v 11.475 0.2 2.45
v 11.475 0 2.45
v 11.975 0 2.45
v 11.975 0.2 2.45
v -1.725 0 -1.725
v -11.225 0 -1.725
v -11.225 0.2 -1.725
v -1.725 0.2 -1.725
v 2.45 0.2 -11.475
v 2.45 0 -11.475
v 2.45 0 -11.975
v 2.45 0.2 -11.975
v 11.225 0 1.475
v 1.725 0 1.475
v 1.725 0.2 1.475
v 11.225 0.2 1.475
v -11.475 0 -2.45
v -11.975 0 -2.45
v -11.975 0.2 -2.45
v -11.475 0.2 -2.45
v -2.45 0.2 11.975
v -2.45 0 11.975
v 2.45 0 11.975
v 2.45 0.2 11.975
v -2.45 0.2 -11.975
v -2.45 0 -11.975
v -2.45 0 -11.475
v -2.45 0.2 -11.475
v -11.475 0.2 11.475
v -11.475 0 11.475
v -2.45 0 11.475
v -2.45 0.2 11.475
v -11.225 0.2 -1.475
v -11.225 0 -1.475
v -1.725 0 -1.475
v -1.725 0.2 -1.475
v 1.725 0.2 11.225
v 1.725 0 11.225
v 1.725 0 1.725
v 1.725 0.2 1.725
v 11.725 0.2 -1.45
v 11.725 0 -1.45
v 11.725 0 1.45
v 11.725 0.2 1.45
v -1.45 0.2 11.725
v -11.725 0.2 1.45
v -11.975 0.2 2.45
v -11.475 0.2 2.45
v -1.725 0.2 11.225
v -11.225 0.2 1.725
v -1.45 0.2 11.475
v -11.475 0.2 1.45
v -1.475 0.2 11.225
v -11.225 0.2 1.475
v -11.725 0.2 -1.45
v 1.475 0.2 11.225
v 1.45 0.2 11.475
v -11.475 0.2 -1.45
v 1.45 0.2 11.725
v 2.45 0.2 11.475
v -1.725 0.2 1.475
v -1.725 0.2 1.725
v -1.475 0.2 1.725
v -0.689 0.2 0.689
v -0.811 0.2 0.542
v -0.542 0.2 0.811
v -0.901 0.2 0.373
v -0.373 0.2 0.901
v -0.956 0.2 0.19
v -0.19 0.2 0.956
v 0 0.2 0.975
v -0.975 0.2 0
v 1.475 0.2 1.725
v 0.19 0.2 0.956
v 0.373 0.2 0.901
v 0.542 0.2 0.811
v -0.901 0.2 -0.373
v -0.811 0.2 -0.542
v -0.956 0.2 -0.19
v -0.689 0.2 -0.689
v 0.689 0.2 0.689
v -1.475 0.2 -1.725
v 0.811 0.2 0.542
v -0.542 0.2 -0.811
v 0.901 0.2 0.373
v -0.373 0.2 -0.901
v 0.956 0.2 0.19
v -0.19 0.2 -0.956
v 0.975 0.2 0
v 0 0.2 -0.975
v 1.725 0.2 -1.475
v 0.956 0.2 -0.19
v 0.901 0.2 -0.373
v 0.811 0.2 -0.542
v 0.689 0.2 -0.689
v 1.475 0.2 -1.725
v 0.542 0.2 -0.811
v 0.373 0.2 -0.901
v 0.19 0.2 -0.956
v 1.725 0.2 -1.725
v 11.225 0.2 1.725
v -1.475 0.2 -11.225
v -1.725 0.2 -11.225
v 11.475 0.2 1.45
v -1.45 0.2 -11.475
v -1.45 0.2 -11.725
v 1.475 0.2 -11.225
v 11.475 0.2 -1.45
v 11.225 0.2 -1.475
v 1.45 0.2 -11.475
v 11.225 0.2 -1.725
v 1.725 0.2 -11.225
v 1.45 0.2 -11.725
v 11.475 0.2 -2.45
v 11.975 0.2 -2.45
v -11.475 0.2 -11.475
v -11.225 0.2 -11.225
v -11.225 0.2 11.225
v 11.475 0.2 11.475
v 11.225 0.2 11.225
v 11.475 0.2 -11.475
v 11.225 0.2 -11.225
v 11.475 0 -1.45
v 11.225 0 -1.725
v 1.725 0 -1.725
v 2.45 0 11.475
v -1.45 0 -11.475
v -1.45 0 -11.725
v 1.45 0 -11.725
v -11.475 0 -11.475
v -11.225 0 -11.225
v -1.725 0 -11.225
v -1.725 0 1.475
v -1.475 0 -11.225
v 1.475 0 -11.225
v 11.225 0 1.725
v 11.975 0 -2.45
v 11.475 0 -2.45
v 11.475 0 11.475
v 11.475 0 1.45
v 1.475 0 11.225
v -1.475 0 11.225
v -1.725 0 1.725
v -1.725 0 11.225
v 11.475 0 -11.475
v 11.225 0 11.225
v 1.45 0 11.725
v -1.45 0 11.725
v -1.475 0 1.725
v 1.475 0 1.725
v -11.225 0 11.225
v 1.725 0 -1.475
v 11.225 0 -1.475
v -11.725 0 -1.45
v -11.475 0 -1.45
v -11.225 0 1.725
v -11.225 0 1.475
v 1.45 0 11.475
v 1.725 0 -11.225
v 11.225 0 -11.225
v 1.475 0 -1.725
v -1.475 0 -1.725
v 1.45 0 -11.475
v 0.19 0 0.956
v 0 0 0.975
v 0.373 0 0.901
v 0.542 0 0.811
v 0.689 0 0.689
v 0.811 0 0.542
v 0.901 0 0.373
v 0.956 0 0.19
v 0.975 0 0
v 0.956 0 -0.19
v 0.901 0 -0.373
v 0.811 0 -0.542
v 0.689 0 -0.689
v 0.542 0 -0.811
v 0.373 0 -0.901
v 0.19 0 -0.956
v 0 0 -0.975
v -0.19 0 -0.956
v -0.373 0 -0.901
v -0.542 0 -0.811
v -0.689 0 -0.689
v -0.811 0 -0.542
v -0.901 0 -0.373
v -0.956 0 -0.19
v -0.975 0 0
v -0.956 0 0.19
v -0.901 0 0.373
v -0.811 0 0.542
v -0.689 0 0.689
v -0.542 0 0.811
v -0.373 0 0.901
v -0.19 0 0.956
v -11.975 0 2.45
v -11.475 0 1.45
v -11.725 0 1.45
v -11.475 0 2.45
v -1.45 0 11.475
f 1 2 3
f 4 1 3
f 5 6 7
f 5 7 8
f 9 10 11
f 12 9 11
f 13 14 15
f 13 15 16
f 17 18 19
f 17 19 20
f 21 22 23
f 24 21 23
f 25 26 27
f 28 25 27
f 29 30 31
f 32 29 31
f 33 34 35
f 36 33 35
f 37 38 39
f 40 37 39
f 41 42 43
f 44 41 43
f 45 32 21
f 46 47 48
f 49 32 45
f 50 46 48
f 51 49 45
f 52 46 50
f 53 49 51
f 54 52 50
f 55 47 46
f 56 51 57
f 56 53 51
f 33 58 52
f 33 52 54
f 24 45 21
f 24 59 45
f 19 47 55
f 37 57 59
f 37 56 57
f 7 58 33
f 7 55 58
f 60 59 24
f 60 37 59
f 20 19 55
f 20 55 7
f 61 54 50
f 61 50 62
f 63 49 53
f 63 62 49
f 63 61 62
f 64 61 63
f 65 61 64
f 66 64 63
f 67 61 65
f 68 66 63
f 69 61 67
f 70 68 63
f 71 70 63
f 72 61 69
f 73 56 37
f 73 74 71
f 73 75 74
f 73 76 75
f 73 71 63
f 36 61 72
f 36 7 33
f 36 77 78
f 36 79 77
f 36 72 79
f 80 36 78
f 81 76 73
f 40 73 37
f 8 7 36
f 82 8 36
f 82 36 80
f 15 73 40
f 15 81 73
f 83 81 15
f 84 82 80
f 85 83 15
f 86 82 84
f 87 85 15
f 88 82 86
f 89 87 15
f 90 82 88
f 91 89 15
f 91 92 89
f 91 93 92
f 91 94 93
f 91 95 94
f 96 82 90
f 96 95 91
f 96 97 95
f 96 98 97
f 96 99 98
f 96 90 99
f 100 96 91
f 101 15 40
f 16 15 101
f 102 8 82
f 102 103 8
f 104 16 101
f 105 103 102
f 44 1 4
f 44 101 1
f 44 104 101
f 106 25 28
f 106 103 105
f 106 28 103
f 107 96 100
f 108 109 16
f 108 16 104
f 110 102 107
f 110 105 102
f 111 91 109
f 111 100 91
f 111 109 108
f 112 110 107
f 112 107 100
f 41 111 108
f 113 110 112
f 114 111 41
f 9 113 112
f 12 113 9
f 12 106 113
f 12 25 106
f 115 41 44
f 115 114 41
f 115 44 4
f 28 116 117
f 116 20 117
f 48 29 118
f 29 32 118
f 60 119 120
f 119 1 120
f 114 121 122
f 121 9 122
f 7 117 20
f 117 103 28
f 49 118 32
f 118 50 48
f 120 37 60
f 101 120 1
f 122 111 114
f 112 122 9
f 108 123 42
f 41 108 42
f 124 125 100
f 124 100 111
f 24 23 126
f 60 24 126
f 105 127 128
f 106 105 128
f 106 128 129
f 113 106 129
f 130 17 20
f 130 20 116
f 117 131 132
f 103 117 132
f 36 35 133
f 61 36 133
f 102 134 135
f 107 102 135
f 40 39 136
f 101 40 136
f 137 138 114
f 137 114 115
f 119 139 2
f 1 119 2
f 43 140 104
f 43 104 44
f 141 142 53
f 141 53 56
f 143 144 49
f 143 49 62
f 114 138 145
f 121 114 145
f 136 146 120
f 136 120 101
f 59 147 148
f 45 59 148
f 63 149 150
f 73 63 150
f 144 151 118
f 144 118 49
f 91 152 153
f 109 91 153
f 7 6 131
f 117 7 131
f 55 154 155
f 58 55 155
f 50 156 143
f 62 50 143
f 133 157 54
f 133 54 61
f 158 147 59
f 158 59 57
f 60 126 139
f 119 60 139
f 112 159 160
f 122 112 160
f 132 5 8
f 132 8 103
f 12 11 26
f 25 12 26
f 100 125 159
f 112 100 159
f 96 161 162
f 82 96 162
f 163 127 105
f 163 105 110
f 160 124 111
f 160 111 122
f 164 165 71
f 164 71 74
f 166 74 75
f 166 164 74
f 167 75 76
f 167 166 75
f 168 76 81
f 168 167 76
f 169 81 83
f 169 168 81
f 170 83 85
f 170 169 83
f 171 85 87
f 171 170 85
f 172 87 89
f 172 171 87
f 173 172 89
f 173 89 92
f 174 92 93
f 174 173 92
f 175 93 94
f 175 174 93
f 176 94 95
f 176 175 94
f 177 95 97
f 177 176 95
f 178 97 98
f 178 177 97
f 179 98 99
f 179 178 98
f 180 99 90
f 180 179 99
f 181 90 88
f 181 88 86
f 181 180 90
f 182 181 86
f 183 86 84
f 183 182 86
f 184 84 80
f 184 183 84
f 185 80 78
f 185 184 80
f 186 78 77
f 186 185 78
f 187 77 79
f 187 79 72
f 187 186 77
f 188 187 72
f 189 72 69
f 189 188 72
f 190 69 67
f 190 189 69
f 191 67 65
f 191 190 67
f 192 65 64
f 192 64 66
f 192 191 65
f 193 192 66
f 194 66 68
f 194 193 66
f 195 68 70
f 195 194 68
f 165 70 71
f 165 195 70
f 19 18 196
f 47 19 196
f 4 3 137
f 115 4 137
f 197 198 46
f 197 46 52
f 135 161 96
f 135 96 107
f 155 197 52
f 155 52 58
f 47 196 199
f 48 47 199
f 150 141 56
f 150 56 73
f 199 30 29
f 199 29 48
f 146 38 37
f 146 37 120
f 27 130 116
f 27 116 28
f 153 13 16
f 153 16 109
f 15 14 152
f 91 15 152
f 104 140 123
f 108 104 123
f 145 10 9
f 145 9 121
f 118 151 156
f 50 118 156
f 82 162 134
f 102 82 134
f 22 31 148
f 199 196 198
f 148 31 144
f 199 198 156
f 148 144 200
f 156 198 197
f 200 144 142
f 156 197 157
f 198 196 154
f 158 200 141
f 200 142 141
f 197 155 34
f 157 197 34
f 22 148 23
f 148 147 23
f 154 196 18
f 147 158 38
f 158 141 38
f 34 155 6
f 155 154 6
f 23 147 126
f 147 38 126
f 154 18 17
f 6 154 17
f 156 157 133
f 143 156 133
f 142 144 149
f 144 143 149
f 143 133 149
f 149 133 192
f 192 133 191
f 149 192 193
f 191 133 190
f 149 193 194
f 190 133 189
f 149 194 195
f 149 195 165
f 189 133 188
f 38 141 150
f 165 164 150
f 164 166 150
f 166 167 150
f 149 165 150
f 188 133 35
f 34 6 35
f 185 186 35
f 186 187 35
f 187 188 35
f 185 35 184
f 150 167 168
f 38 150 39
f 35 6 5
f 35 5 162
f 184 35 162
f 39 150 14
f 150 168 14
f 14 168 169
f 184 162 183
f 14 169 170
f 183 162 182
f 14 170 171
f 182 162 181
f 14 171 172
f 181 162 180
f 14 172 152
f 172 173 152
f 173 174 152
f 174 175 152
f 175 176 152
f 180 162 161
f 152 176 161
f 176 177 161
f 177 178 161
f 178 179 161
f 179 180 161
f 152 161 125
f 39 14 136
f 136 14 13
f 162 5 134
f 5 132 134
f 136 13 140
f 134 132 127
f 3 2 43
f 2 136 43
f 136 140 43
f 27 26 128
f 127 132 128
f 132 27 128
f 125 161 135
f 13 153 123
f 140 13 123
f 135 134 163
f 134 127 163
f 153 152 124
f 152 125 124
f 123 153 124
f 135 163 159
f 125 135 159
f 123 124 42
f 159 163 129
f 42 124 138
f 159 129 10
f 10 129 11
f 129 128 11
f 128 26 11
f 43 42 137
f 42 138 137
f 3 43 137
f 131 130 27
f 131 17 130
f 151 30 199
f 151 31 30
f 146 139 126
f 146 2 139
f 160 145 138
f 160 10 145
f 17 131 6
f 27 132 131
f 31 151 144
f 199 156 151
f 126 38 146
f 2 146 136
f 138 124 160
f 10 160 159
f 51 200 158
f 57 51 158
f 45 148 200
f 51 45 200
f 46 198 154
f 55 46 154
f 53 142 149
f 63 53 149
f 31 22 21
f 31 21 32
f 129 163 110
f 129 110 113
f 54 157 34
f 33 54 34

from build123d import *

# Parameters (mm, degrees)
SKETCH1_W           = 22.95
SKETCH1_H           = 22.95
SKETCH1_W_2         = 22.45
SKETCH1_H_2         = 22.45
SKETCH1_W_3         = 0.25
SKETCH1_H_3         = 9.5
SKETCH1_W_4         = 9.5
SKETCH1_H_4         = 0.25
SKETCH1_R           = 0.975
SKETCH1_H_5         = 1
SKETCH1_W_5         = 1
BOSS_EXTRUDE5_DEPTH = 0.2


with BuildPart() as part:
    # Sketch1 → Boss-Extrude5 (new body)
    # profile 1 of 26: a face of its own
    with BuildSketch(Plane(origin=(0, 0, 0), x_dir=(1, 0, 0), z_dir=(0, 1, 0))):
        Rectangle(SKETCH1_W, SKETCH1_H)
        Rectangle(SKETCH1_W_2, SKETCH1_H_2, mode=Mode.SUBTRACT)
    # profile 2 of 26: a face of its own
    with BuildSketch(Plane(origin=(0, 0, 0), x_dir=(1, 0, 0), z_dir=(0, 1, 0))):
        with Locations((-1.6, -6.475)):
            Rectangle(SKETCH1_W_3, SKETCH1_H_3)
    # profile 3 of 26: a face of its own
    with BuildSketch(Plane(origin=(0, 0, 0), x_dir=(1, 0, 0), z_dir=(0, 1, 0))):
        with Locations((-6.475, -1.6)):
            Rectangle(SKETCH1_W_4, SKETCH1_H_4)
    # profile 4 of 26: a face of its own
    with BuildSketch(Plane(origin=(0, 0, 0), x_dir=(1, 0, 0), z_dir=(0, 1, 0))):
        Polygon((-1.475, -1.475), (-1.475, -1.725), (1.475, -1.725), (1.475, -1.475), (1.725, -1.475), (1.725, 1.475), (1.475, 1.475), (1.475, 1.725), (-1.475, 1.725), (-1.475, 1.475), (-1.725, 1.475), (-1.725, -1.475), align=None)
        with Locations(Location((0, 0, 0), (0, 0, 270))):
            Circle(SKETCH1_R, mode=Mode.SUBTRACT)
    # profile 5 of 26: a face of its own
    with BuildSketch(Plane(origin=(0, 0, 0), x_dir=(1, 0, 0), z_dir=(0, 1, 0))):
        with Locations((-1.6, -1.6)):
            Rectangle(SKETCH1_W_3, SKETCH1_H_4)
    # profile 6 of 26: a face of its own
    with BuildSketch(Plane(origin=(0, 0, 0), x_dir=(1, 0, 0), z_dir=(0, 1, 0))):
        with Locations((1.6, -1.6)):
            Rectangle(SKETCH1_W_3, SKETCH1_H_4)
    # profile 7 of 26: a face of its own
    with BuildSketch(Plane(origin=(0, 0, 0), x_dir=(1, 0, 0), z_dir=(0, 1, 0))):
        with Locations((6.475, -1.6)):
            Rectangle(SKETCH1_W_4, SKETCH1_H_4)
    # profile 8 of 26: a face of its own
    with BuildSketch(Plane(origin=(0, 0, 0), x_dir=(1, 0, 0), z_dir=(0, 1, 0))):
        with Locations((1.6, -6.475)):
            Rectangle(SKETCH1_W_3, SKETCH1_H_3)
    # profile 9 of 26: a face of its own
    with BuildSketch(Plane(origin=(0, 0, 0), x_dir=(1, 0, 0), z_dir=(0, 1, 0))):
        with Locations((1.6, 1.6)):
            Rectangle(SKETCH1_W_3, SKETCH1_H_4)
    # profile 10 of 26: a face of its own
    with BuildSketch(Plane(origin=(0, 0, 0), x_dir=(1, 0, 0), z_dir=(0, 1, 0))):
        with Locations((6.475, 1.6)):
            Rectangle(SKETCH1_W_4, SKETCH1_H_4)
    # profile 11 of 26: a face of its own
    with BuildSketch(Plane(origin=(0, 0, 0), x_dir=(1, 0, 0), z_dir=(0, 1, 0))):
        with Locations((1.6, 6.475)):
            Rectangle(SKETCH1_W_3, SKETCH1_H_3)
    # profile 12 of 26: a face of its own
    with BuildSketch(Plane(origin=(0, 0, 0), x_dir=(1, 0, 0), z_dir=(0, 1, 0))):
        with Locations((-1.6, 1.6)):
            Rectangle(SKETCH1_W_3, SKETCH1_H_4)
    # profile 13 of 26: a face of its own
    with BuildSketch(Plane(origin=(0, 0, 0), x_dir=(1, 0, 0), z_dir=(0, 1, 0))):
        with Locations((-6.475, 1.6)):
            Rectangle(SKETCH1_W_4, SKETCH1_H_4)
    # profile 14 of 26: a face of its own
    with BuildSketch(Plane(origin=(0, 0, 0), x_dir=(1, 0, 0), z_dir=(0, 1, 0))):
        with Locations((-1.6, 6.475)):
            Rectangle(SKETCH1_W_3, SKETCH1_H_3)
    # profile 15 of 26: a face of its own
    with BuildSketch(Plane(origin=(0, 0, 0), x_dir=(1, 0, 0), z_dir=(0, 1, 0))):
        with Locations((-11.6, -1.95)):
            Rectangle(SKETCH1_W_3, SKETCH1_H_5)
    # profile 16 of 26: a face of its own
    with BuildSketch(Plane(origin=(0, 0, 0), x_dir=(1, 0, 0), z_dir=(0, 1, 0))):
        with Locations((-11.6, 1.95)):
            Rectangle(SKETCH1_W_3, SKETCH1_H_5)
    # profile 17 of 26: a face of its own
    with BuildSketch(Plane(origin=(0, 0, 0), x_dir=(1, 0, 0), z_dir=(0, 1, 0))):
        with Locations((11.6, -1.95)):
            Rectangle(SKETCH1_W_3, SKETCH1_H_5)
    # profile 18 of 26: a face of its own
    with BuildSketch(Plane(origin=(0, 0, 0), x_dir=(1, 0, 0), z_dir=(0, 1, 0))):
        with Locations((11.6, 1.95)):
            Rectangle(SKETCH1_W_3, SKETCH1_H_5)
    # profile 19 of 26: a face of its own
    with BuildSketch(Plane(origin=(0, 0, 0), x_dir=(1, 0, 0), z_dir=(0, 1, 0))):
        with Locations((1.95, -11.6)):
            Rectangle(SKETCH1_W_5, SKETCH1_H_4)
    # profile 20 of 26: a face of its own
    with BuildSketch(Plane(origin=(0, 0, 0), x_dir=(1, 0, 0), z_dir=(0, 1, 0))):
        with Locations((-1.95, -11.6)):
            Rectangle(SKETCH1_W_5, SKETCH1_H_4)
    # profile 21 of 26: a face of its own
    with BuildSketch(Plane(origin=(0, 0, 0), x_dir=(1, 0, 0), z_dir=(0, 1, 0))):
        with Locations((1.95, 11.6)):
            Rectangle(SKETCH1_W_5, SKETCH1_H_4)
    # profile 22 of 26: a face of its own
    with BuildSketch(Plane(origin=(0, 0, 0), x_dir=(1, 0, 0), z_dir=(0, 1, 0))):
        with Locations((-1.95, 11.6)):
            Rectangle(SKETCH1_W_5, SKETCH1_H_4)
    # profile 23 of 26: a face of its own
    with BuildSketch(Plane(origin=(0, 0, 0), x_dir=(1, 0, 0), z_dir=(0, 1, 0))):
        Polygon((-11.975, -2.45), (-11.725, -2.45), (-11.725, -1.45), (-11.725, 1.45), (-11.725, 2.45), (-11.975, 2.45), align=None)
    # profile 24 of 26: a face of its own
    with BuildSketch(Plane(origin=(0, 0, 0), x_dir=(1, 0, 0), z_dir=(0, 1, 0))):
        Polygon((2.45, -11.975), (2.45, -11.725), (1.45, -11.725), (-1.45, -11.725), (-2.45, -11.725), (-2.45, -11.975), align=None)
    # profile 25 of 26: a face of its own
    with BuildSketch(Plane(origin=(0, 0, 0), x_dir=(1, 0, 0), z_dir=(0, 1, 0))):
        Polygon((11.725, -1.45), (11.725, -2.45), (11.975, -2.45), (11.975, 2.45), (11.725, 2.45), (11.725, 1.45), align=None)
    # profile 26 of 26: a face of its own
    with BuildSketch(Plane(origin=(0, 0, 0), x_dir=(1, 0, 0), z_dir=(0, 1, 0))):
        Polygon((1.45, 11.725), (2.45, 11.725), (2.45, 11.975), (-2.45, 11.975), (-2.45, 11.725), (-1.45, 11.725), align=None)
    extrude(amount=BOSS_EXTRUDE5_DEPTH)


solid = part.part
